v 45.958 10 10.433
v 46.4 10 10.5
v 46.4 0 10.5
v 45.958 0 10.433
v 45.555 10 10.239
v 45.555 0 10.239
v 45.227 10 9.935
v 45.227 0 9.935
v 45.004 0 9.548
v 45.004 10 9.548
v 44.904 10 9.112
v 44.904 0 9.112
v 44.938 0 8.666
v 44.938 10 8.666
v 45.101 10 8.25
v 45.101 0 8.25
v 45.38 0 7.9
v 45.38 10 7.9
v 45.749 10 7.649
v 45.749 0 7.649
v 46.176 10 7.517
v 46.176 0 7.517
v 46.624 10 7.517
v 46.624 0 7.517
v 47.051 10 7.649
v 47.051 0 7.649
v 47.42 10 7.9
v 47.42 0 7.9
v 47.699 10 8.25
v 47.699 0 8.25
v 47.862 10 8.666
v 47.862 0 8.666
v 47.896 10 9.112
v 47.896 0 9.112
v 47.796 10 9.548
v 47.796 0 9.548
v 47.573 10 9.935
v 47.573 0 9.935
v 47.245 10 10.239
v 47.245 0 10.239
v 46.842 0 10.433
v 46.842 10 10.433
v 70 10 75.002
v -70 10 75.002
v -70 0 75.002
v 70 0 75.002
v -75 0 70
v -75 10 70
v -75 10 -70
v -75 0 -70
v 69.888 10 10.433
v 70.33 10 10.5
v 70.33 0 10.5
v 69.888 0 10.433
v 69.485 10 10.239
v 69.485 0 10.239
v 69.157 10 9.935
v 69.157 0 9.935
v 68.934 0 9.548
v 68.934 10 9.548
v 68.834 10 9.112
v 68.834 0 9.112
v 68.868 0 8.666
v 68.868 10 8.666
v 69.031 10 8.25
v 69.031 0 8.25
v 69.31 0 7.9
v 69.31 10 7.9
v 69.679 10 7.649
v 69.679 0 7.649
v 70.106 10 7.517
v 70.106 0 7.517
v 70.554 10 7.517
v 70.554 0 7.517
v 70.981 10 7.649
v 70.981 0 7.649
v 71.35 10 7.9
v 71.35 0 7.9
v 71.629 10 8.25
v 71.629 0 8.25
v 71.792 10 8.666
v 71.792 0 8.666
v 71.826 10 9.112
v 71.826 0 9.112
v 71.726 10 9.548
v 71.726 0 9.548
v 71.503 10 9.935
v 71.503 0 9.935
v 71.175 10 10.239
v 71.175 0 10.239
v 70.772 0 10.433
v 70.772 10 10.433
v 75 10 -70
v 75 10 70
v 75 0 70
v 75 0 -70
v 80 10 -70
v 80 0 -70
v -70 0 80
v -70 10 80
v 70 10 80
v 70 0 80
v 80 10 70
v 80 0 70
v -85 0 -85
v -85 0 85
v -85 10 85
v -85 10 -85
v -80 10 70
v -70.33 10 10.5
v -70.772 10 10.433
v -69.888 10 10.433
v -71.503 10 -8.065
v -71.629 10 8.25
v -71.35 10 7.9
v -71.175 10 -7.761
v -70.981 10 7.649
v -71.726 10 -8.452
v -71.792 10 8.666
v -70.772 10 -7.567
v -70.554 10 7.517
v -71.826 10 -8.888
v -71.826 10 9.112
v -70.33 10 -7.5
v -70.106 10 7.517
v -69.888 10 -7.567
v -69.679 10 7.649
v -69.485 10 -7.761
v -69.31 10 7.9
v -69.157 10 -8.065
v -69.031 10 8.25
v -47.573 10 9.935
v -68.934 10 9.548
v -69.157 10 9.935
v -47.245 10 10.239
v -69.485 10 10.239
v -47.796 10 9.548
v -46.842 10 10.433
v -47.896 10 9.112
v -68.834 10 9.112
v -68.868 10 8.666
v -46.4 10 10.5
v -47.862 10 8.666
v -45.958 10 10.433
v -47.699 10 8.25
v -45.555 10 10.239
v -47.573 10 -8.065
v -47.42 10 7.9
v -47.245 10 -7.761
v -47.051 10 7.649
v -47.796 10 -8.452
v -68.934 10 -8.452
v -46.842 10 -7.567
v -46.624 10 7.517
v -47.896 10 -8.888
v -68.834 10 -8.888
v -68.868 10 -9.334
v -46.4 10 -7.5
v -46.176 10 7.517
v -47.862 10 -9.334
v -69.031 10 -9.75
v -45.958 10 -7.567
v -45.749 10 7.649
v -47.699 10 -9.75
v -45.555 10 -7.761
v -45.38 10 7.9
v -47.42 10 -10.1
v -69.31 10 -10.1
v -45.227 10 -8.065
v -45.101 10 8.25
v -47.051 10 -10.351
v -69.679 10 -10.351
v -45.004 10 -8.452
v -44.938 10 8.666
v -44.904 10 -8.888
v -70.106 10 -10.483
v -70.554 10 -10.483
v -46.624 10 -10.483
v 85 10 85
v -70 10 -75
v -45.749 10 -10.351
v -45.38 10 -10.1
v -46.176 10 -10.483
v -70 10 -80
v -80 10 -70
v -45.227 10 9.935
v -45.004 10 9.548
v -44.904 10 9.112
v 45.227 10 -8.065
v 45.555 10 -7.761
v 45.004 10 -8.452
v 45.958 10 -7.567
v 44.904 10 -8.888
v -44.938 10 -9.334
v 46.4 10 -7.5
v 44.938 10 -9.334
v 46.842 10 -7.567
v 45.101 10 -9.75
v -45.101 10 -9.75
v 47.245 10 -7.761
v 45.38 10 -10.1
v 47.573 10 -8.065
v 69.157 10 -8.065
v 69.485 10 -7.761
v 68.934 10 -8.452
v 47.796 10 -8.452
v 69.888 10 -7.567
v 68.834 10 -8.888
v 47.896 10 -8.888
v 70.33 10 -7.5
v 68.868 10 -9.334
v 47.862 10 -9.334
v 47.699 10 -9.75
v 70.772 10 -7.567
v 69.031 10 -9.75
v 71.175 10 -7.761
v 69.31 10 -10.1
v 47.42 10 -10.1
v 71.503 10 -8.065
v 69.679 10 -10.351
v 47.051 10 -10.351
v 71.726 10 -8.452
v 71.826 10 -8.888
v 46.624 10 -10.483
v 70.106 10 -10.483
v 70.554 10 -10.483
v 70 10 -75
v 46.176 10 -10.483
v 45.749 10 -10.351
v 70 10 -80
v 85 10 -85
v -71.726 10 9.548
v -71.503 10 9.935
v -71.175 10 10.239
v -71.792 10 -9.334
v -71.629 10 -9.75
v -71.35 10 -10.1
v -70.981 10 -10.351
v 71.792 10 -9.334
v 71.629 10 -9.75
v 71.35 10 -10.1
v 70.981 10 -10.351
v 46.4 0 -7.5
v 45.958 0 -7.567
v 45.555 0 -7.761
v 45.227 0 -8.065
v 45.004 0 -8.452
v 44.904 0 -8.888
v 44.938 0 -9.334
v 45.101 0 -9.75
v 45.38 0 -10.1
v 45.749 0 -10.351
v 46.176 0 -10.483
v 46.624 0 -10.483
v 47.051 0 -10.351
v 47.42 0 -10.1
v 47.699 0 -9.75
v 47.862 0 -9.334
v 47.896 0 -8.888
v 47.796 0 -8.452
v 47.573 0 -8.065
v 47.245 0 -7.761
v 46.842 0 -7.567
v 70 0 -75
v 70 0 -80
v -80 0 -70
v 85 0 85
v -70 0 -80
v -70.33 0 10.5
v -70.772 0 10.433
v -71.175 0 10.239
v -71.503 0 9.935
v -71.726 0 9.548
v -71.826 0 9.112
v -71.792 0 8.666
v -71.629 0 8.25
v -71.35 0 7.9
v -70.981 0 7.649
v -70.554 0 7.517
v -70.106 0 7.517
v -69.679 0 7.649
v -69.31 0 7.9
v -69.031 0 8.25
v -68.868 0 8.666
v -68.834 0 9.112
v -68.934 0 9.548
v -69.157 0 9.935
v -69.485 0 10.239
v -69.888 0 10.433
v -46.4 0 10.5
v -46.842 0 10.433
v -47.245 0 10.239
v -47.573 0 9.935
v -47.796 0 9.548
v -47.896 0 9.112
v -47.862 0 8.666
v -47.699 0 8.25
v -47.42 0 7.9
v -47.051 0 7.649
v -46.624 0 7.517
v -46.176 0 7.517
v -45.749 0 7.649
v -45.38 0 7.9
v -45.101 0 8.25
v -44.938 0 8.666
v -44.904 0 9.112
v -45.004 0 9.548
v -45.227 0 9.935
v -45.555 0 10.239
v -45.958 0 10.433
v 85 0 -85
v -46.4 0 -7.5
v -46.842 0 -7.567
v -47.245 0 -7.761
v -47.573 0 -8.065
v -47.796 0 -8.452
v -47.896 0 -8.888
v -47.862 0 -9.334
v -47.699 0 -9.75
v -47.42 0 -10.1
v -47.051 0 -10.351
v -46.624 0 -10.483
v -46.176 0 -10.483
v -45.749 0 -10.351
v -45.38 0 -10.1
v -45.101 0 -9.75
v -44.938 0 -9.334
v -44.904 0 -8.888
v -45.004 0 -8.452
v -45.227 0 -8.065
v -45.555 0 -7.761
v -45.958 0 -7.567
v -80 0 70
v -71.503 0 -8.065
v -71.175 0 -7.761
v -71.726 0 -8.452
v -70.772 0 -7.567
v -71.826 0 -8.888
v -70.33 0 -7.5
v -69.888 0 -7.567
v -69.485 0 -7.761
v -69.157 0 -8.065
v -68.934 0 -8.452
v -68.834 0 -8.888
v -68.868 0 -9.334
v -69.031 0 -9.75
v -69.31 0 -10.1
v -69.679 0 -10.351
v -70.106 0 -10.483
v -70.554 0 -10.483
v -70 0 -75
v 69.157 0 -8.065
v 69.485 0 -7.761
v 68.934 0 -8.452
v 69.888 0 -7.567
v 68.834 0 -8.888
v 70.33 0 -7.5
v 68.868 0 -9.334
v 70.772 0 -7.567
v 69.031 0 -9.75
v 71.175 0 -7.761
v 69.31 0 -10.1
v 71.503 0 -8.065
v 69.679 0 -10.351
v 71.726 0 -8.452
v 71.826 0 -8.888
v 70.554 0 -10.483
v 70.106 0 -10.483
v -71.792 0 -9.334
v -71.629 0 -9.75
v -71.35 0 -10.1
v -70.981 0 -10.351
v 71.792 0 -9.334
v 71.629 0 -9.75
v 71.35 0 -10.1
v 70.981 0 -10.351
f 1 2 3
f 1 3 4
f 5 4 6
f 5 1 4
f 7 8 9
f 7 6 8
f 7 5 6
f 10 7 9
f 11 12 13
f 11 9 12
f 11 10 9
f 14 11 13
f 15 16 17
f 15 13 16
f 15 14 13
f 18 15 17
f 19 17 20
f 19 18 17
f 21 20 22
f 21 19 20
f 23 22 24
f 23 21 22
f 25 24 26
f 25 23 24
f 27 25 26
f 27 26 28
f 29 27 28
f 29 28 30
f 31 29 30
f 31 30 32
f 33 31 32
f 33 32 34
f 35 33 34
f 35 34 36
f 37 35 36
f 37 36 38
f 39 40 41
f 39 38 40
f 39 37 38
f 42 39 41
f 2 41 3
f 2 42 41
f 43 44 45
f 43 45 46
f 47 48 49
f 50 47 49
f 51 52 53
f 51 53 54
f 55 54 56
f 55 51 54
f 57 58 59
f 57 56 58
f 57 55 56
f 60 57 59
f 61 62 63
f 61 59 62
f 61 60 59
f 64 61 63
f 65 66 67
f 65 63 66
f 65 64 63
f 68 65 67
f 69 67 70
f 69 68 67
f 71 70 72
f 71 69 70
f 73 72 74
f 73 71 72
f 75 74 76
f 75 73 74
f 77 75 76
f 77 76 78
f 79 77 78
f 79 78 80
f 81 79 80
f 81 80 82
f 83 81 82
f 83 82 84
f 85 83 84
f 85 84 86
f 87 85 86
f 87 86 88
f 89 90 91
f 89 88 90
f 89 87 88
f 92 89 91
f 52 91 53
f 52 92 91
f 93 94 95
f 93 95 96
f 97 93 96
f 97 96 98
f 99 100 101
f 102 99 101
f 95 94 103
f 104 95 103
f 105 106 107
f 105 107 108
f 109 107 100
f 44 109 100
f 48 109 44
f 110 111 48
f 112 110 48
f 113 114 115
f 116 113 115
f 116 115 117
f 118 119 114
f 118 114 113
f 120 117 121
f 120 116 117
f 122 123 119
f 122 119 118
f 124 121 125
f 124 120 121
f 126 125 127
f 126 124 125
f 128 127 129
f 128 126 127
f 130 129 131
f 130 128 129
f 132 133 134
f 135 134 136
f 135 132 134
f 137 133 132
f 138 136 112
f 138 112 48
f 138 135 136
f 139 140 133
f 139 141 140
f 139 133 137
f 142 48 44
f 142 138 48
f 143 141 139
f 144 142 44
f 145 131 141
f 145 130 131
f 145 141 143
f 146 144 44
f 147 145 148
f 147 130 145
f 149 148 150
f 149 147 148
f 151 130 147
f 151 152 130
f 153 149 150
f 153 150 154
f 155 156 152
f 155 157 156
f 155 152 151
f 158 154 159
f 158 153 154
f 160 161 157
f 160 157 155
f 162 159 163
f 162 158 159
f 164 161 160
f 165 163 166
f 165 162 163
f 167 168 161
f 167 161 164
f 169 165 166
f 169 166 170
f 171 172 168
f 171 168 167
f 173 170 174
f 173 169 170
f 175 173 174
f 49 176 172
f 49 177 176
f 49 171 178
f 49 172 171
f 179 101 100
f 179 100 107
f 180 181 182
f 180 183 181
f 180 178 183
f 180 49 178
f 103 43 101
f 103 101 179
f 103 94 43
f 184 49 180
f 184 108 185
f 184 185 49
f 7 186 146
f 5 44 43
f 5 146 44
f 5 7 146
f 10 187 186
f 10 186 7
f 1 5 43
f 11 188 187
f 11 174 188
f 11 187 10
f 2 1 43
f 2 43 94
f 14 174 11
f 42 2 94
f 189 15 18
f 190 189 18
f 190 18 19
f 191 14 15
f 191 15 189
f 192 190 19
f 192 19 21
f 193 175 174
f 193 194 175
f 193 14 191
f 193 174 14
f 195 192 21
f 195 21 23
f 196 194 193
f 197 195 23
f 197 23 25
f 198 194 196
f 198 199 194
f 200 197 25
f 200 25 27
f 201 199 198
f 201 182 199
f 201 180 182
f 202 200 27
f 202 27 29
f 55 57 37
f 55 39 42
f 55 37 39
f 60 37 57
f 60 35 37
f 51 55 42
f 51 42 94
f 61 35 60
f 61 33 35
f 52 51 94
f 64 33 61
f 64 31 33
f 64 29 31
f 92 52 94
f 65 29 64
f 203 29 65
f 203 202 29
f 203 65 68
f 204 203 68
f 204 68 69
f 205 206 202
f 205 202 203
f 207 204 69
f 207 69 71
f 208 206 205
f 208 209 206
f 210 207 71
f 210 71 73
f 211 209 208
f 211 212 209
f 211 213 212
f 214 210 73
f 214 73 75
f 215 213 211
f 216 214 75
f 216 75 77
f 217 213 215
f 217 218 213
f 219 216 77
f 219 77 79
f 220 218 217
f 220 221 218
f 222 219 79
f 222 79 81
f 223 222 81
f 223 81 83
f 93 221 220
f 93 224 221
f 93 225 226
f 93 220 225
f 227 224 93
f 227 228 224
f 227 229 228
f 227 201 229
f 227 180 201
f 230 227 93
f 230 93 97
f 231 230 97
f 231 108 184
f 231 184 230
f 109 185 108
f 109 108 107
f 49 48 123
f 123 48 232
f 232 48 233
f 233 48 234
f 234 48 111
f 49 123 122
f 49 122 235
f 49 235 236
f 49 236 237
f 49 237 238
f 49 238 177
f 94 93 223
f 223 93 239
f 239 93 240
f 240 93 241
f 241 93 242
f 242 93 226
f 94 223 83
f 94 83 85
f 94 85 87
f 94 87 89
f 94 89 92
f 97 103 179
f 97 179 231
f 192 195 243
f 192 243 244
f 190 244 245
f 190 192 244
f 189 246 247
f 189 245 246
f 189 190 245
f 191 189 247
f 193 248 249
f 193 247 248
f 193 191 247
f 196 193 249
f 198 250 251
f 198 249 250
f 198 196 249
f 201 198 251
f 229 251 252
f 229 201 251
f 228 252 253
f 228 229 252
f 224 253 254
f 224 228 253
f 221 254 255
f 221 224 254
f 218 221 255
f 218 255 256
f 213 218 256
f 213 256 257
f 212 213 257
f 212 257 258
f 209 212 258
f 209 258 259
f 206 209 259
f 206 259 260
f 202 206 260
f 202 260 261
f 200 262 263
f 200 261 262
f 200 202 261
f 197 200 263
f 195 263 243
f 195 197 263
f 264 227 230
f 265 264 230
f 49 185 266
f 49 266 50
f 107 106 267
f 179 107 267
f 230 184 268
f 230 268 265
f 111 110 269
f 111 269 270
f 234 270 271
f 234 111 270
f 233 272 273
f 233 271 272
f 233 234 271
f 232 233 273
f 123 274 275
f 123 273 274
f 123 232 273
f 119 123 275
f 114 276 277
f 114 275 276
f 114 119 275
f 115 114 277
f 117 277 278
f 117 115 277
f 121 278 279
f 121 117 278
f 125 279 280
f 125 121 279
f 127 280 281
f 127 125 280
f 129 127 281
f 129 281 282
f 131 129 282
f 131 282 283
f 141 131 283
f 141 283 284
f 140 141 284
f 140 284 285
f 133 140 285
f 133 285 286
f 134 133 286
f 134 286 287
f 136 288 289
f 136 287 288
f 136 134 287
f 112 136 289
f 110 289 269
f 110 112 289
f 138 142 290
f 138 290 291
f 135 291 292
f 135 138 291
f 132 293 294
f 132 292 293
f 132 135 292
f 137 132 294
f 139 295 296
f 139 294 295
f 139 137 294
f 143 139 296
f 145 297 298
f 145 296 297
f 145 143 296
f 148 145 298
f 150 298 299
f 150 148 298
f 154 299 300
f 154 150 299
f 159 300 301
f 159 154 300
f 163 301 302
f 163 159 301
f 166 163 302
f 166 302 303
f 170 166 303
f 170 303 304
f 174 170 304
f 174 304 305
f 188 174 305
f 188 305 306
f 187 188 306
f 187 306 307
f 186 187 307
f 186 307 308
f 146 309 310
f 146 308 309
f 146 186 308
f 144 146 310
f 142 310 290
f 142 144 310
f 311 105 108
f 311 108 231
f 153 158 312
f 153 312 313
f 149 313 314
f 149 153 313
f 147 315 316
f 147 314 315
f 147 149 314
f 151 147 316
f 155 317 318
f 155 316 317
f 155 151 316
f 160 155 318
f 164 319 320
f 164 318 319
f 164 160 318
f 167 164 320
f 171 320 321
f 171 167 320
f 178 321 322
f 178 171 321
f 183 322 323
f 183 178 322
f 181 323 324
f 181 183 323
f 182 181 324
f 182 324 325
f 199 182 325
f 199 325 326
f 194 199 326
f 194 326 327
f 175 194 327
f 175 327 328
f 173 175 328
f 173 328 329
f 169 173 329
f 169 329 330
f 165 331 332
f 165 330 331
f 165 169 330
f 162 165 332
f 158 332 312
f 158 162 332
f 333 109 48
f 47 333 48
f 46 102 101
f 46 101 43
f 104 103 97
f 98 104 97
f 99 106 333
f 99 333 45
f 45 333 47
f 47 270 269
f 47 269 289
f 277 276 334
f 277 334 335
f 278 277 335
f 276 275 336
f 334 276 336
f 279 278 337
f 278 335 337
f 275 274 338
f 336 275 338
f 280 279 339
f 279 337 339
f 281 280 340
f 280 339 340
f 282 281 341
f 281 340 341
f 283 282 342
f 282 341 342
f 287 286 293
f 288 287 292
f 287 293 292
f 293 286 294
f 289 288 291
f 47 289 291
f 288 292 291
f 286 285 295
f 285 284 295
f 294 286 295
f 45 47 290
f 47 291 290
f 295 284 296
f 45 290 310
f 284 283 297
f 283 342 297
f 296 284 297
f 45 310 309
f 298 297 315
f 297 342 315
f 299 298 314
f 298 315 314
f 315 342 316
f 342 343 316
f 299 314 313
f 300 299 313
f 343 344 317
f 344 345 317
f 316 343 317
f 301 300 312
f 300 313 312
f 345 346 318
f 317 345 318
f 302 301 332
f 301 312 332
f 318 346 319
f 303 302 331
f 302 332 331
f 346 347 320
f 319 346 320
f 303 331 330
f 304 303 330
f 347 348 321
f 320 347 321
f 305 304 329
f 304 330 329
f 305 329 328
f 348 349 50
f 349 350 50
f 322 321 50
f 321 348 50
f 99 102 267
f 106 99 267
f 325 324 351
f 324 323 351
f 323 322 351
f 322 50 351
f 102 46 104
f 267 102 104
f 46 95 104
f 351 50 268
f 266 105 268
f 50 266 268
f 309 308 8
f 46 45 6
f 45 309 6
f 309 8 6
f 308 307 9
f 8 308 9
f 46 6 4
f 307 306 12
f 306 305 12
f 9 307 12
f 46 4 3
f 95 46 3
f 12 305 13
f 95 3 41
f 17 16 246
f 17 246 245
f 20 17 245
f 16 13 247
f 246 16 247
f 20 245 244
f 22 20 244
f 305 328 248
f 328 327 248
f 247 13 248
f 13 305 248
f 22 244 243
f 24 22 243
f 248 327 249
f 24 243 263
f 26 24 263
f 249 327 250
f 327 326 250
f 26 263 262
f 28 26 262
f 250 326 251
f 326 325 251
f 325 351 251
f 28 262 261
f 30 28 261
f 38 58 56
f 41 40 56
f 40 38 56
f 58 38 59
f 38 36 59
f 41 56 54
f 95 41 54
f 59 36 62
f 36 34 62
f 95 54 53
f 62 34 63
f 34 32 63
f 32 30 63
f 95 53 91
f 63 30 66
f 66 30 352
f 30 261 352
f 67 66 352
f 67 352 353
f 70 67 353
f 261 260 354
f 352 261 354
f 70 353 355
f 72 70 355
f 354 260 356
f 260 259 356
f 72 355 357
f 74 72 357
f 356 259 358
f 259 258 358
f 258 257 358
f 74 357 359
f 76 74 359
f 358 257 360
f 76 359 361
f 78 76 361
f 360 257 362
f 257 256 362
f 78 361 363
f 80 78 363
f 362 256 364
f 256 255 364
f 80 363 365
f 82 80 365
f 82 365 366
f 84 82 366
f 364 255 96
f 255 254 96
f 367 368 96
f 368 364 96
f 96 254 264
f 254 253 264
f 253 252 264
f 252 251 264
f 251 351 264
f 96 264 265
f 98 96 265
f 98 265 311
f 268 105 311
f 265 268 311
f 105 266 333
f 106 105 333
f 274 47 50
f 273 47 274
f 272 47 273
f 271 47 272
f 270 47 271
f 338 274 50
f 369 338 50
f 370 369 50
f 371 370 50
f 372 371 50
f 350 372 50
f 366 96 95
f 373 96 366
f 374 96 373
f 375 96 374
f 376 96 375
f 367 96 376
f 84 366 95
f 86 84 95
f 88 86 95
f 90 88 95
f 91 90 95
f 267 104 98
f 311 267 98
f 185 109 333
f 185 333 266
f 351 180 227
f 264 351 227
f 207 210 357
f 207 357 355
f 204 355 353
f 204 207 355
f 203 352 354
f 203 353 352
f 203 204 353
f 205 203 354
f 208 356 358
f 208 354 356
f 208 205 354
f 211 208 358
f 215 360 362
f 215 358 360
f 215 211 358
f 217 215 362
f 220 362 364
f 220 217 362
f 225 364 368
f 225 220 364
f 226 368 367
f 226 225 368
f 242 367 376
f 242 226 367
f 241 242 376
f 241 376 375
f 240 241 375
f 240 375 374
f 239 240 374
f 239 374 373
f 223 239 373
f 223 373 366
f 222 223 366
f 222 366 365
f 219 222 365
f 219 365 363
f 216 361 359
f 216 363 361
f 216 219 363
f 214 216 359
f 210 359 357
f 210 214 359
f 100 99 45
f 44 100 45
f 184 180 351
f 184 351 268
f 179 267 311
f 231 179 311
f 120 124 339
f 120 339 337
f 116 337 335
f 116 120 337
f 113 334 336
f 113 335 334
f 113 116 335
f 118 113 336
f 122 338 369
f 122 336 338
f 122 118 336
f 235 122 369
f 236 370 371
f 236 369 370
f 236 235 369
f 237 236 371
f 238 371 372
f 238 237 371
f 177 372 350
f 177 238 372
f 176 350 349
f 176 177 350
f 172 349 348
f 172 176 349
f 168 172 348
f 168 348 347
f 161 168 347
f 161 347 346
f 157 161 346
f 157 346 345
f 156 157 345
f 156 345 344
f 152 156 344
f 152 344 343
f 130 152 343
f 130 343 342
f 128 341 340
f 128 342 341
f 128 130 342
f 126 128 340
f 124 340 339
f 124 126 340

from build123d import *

# Parameters (mm, degrees)
SKETCH2_W               = 170
SKETCH2_H               = 170
BOSS_EXTRUDE1_DEPTH     = 10
SKETCH3_W               = 5
SKETCH3_H               = 140
SKETCH3_W_2             = 140
SKETCH3_H_2             = 4.998101886
SKETCH3_H_3             = 5
CUT_EXTRUDE1_DEPTH      = 10
CUT_EXTRUDE2_DEPTH      = 121.623380818
CUT_EXTRUDE2_DEPTH_BACK = 121.623380818
SKETCH4_R               = 1.5


with BuildPart() as part:
    # Sketch2 → Boss-Extrude1 (new body)
    with BuildSketch(Plane(origin=(0, 0, 0), x_dir=(1, 0, 0), z_dir=(0, 1, 0))):
        Rectangle(SKETCH2_W, SKETCH2_H)
    extrude(amount=BOSS_EXTRUDE1_DEPTH)

    # Sketch3 → Cut-Extrude1 (cut)
    with BuildSketch(Plane(origin=(0, 10, 0), x_dir=(1, 0, 0), z_dir=(0, 1, 0))):
        with Locations((-77.5, 0)):
            Rectangle(SKETCH3_W, SKETCH3_H)
        with Locations((0, -77.500949057)):
            Rectangle(SKETCH3_W_2, SKETCH3_H_2)
        with Locations((77.5, 0)):
            Rectangle(SKETCH3_W, SKETCH3_H)
        with Locations((0, 77.5)):
            Rectangle(SKETCH3_W_2, SKETCH3_H_3)
    extrude(amount=-CUT_EXTRUDE1_DEPTH, mode=Mode.SUBTRACT)

    # Sketch4 → Cut-Extrude2 (cut, two sides: drawn at the far end of the back side and taken through both)
    with BuildSketch(Plane(origin=(0, 0, 0), x_dir=(-1, 0, 0), z_dir=(0, -1, 0)).offset(-CUT_EXTRUDE2_DEPTH_BACK)):
        with Locations(Location((-70.33, -9, 0), (0, 0, 270))):
            Circle(SKETCH4_R)
        with Locations(Location((-70.33, 9, 0), (0, 0, 270))):
            Circle(SKETCH4_R)
        with Locations(Location((70.33, 9, 0), (0, 0, 270))):
            Circle(SKETCH4_R)
        with Locations(Location((70.33, -9, 0), (0, 0, 270))):
            Circle(SKETCH4_R)
        with Locations(Location((46.4, 9, 0), (0, 0, 270))):
            Circle(SKETCH4_R)
        with Locations(Location((46.4, -9, 0), (0, 0, 270))):
            Circle(SKETCH4_R)
        with Locations(Location((-46.4, -9, 0), (0, 0, 270))):
            Circle(SKETCH4_R)
        with Locations(Location((-46.4, 9, 0), (0, 0, 270))):
            Circle(SKETCH4_R)
    extrude(amount=CUT_EXTRUDE2_DEPTH + CUT_EXTRUDE2_DEPTH_BACK, mode=Mode.SUBTRACT)


solid = part.part
